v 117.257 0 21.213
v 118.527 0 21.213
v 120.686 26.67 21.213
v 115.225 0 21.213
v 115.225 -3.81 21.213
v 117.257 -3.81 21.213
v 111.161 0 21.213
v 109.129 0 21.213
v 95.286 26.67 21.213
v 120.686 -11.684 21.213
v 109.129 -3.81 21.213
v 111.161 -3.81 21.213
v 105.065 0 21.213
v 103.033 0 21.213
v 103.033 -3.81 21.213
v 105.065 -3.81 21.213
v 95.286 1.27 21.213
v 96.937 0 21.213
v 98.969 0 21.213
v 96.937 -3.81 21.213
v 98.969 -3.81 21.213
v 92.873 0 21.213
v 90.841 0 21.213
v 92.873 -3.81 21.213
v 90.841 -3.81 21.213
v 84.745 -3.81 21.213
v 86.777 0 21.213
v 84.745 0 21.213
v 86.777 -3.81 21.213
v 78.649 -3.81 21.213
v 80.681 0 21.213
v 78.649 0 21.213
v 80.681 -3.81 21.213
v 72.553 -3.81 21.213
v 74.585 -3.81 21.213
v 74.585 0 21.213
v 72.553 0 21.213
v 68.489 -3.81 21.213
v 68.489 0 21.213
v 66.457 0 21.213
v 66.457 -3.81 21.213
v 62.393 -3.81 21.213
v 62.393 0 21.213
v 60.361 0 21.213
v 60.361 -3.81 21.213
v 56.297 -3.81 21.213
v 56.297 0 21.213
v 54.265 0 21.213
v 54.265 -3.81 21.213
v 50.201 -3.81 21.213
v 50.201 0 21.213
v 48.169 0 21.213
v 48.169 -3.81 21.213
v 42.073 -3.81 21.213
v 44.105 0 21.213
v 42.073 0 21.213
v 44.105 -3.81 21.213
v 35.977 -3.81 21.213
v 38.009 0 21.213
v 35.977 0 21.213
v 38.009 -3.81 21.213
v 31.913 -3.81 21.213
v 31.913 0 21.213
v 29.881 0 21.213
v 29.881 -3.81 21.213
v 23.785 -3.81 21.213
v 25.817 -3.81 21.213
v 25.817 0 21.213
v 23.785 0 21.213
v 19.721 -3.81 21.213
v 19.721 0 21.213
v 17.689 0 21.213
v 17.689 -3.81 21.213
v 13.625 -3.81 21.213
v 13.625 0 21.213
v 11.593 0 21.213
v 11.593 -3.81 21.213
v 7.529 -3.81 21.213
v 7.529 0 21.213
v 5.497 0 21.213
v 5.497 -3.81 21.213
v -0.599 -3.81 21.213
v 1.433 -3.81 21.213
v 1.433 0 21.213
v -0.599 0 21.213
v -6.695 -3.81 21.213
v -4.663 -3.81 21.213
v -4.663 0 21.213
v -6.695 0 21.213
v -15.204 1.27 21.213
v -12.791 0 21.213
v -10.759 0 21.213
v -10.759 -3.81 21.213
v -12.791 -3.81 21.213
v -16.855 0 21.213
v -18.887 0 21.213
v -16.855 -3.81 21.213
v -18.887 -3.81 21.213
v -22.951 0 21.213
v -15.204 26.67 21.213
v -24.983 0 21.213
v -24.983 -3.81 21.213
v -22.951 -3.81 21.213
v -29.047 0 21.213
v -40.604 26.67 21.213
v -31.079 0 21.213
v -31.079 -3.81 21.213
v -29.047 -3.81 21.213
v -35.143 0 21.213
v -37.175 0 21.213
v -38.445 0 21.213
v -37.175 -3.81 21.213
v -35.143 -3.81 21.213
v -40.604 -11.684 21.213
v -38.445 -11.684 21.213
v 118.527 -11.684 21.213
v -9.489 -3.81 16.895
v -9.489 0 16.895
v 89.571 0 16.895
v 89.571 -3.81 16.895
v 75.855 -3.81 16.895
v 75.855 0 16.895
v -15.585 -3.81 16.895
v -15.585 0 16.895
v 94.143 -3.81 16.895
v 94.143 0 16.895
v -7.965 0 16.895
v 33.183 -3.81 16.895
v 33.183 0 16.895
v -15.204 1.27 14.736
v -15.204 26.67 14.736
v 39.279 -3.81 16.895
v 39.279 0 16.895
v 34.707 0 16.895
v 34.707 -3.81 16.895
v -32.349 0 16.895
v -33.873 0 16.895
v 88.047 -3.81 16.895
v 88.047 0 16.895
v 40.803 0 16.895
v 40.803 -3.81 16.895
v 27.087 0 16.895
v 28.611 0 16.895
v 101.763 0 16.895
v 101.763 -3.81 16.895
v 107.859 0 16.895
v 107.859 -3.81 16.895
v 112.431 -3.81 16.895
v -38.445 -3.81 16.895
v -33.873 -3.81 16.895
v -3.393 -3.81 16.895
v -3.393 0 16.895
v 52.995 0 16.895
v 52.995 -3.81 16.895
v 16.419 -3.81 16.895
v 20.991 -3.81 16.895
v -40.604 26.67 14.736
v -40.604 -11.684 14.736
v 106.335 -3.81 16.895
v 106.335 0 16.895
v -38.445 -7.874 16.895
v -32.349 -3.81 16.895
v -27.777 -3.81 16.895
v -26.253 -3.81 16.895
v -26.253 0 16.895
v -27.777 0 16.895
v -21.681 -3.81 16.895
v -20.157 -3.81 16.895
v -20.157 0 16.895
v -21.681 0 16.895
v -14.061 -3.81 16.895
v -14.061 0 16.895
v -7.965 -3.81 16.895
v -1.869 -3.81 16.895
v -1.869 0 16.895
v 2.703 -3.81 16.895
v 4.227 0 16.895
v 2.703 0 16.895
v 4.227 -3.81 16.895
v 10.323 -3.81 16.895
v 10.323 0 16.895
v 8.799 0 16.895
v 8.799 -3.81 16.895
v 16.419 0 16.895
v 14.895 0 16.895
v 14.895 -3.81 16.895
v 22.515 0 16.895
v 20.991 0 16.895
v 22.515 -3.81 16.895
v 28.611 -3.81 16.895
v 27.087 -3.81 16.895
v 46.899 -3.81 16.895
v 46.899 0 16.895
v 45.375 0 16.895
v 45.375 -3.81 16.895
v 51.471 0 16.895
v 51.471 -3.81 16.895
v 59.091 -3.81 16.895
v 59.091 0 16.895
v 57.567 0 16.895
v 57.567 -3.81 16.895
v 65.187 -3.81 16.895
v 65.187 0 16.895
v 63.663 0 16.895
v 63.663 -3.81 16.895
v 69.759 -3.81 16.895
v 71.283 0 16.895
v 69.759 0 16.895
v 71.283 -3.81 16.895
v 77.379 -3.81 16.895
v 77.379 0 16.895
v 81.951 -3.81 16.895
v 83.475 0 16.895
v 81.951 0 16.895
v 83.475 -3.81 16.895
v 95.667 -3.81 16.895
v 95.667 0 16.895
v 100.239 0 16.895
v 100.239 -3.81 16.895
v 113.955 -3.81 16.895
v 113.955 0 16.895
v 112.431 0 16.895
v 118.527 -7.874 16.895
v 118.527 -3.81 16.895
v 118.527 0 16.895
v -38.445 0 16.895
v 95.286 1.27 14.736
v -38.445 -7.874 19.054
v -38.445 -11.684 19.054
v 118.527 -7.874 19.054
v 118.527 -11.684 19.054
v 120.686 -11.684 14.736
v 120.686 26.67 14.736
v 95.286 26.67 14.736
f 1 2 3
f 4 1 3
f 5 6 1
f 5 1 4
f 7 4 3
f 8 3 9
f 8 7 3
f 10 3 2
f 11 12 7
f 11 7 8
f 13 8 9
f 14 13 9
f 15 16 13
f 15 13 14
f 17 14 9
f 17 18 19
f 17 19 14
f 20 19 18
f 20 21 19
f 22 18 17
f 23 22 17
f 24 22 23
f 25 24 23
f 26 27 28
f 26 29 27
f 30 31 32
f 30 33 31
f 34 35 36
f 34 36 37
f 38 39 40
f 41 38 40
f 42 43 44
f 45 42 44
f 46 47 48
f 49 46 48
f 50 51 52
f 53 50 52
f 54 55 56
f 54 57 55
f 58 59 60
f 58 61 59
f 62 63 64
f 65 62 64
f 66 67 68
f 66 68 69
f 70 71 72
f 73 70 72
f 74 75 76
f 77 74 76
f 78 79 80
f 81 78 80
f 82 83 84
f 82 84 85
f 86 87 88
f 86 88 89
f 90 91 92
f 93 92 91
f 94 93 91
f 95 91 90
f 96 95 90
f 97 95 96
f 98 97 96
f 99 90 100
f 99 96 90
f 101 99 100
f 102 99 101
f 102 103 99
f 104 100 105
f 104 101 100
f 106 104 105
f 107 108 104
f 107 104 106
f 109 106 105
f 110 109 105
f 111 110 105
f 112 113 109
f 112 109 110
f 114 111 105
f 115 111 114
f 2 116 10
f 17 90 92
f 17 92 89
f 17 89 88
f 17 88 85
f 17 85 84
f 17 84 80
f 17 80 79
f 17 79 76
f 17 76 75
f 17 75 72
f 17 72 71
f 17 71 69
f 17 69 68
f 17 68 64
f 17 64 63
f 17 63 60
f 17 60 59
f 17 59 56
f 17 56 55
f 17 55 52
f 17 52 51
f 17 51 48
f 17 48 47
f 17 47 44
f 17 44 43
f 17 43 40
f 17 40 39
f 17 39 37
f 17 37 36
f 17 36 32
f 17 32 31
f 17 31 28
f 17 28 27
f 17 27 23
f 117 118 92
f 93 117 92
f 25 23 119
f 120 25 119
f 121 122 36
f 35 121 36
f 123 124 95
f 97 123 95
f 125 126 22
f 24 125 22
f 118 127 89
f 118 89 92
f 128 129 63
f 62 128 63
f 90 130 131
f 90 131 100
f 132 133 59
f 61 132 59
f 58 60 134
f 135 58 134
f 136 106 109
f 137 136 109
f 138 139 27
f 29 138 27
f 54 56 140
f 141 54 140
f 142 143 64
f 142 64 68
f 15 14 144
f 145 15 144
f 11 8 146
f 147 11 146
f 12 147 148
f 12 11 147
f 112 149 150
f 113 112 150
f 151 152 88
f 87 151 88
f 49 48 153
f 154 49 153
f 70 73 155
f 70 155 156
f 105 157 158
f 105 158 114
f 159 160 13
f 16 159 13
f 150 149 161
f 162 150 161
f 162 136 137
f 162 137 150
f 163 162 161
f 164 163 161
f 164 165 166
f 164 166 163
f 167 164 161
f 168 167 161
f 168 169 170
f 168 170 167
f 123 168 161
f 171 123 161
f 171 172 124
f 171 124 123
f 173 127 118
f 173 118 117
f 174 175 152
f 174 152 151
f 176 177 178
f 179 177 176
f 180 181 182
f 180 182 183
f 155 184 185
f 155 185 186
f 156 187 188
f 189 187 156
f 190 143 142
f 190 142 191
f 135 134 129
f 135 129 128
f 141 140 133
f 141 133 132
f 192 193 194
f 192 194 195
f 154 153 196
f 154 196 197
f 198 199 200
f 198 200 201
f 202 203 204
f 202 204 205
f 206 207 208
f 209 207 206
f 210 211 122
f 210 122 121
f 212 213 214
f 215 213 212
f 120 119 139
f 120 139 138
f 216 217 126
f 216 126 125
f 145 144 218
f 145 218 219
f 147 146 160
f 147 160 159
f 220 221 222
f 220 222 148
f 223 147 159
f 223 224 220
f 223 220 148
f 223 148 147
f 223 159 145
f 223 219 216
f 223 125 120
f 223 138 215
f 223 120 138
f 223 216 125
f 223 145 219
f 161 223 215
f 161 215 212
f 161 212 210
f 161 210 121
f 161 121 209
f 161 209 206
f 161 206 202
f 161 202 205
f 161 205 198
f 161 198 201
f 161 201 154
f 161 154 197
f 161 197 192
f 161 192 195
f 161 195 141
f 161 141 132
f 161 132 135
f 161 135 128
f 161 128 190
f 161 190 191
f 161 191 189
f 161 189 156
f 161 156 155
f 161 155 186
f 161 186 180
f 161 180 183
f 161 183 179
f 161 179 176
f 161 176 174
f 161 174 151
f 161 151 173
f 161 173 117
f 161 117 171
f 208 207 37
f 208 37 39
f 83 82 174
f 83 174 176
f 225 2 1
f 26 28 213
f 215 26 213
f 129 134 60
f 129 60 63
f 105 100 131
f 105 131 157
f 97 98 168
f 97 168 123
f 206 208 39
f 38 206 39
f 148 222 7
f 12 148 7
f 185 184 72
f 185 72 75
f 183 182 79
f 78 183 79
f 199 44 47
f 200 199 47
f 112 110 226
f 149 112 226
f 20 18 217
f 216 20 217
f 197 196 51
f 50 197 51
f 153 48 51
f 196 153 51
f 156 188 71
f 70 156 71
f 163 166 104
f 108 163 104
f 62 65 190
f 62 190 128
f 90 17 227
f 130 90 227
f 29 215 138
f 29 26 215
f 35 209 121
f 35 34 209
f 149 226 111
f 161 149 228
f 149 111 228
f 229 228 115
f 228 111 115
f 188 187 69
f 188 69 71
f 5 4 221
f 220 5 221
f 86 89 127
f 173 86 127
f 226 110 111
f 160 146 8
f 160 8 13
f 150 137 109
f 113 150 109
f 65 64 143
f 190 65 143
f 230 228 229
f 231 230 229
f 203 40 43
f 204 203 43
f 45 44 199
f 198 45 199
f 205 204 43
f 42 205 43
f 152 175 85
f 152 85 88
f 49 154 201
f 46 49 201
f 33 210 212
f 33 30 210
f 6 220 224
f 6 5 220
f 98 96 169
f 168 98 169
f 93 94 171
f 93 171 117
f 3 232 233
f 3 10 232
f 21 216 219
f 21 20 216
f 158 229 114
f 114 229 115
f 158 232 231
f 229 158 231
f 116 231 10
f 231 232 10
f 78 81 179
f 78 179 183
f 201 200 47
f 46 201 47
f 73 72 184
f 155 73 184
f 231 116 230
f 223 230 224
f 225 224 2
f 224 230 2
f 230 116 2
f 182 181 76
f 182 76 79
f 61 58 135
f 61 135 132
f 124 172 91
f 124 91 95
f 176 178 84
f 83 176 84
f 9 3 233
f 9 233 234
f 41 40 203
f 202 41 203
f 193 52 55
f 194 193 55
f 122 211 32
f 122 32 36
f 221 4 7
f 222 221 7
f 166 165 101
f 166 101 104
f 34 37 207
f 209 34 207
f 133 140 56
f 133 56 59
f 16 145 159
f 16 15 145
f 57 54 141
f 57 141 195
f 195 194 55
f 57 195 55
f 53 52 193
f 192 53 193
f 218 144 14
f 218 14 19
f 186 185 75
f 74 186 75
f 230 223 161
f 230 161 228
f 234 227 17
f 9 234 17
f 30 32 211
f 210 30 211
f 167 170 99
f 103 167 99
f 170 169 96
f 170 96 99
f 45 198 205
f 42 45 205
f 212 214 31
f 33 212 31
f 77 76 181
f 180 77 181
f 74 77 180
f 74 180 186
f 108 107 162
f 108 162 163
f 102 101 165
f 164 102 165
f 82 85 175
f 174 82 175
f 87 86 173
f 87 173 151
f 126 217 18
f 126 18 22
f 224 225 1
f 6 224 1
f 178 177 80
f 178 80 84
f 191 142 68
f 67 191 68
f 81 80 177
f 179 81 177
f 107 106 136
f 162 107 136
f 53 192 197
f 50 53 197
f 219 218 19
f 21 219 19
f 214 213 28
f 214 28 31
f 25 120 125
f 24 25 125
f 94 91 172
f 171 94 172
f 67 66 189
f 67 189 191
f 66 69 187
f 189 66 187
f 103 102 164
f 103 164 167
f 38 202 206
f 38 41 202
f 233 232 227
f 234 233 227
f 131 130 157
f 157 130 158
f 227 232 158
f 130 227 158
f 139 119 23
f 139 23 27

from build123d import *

# Parameters (mm, degrees)
F1_DEPTH  = 3.81
F5_DEPTH  = 156.972
F7_DEPTH  = 1.27
F9_W      = 12.954
F9_H      = 2.159
F9_H_2    = 4.318
F10_DEPTH = 2.159
F11_W     = 12.954
F11_H     = 4.318
F11_H_2   = 2.159
F12_DEPTH = 2.159
F13_W     = 25.4
F13_H     = 6.477
F14_DEPTH = 25.4


with BuildPart() as f1:
    # F0 (on Front) → F1 (new body)
    with BuildSketch(Plane.XZ):
        Polygon((-37.1748663006, 21.2125933835), (-38.4448663006, 16.8945933835), (-33.8728663006, 16.8945933835), (-35.1428663006, 21.2125933835), align=None)
        Polygon((-33.8728663006, 16.8945933835), (-38.4448663006, 16.8945933835), (-38.4448663006, 14.7355933835), (118.5271336994, 14.7355933835), (118.5271336994, 16.8945933835), (113.9551336994, 16.8945933835), (112.4311336994, 16.8945933835), (107.8591336994, 16.8945933835), (106.3351336994, 16.8945933835), (101.7631336994, 16.8945933835), (100.2391336994, 16.8945933835), (95.6671336994, 16.8945933835), (94.1431336994, 16.8945933835), (89.5711336994, 16.8945933835), (88.0471336994, 16.8945933835), (83.4751336994, 16.8945933835), (81.9511336994, 16.8945933835), (77.3791336994, 16.8945933835), (75.8551336994, 16.8945933835), (71.2831336994, 16.8945933835), (69.7591336994, 16.8945933835), (65.1871336994, 16.8945933835), (63.6631336994, 16.8945933835), (59.0911336994, 16.8945933835), (57.5671336994, 16.8945933835), (52.9951336994, 16.8945933835), (51.4711336994, 16.8945933835), (46.8991336994, 16.8945933835), (45.3751336994, 16.8945933835), (40.8031336994, 16.8945933835), (39.2791336994, 16.8945933835), (34.7071336994, 16.8945933835), (33.1831336994, 16.8945933835), (28.6111336994, 16.8945933835), (27.0871336994, 16.8945933835), (22.5151336994, 16.8945933835), (20.9911336994, 16.8945933835), (16.4191336994, 16.8945933835), (14.8951336994, 16.8945933835), (10.3231336994, 16.8945933835), (8.7991336994, 16.8945933835), (4.2271336994, 16.8945933835), (2.7031336994, 16.8945933835), (-1.8688663006, 16.8945933835), (-3.3928663006, 16.8945933835), (-7.9648663006, 16.8945933835), (-9.4888663006, 16.8945933835), (-14.0608663006, 16.8945933835), (-15.5848663006, 16.8945933835), (-20.1568663006, 16.8945933835), (-21.6808663006, 16.8945933835), (-26.2528663006, 16.8945933835), (-27.7768663006, 16.8945933835), (-32.3488663006, 16.8945933835), align=None)
        Polygon((-31.0788663006, 21.2125933835), (-32.3488663006, 16.8945933835), (-27.7768663006, 16.8945933835), (-29.0468663006, 21.2125933835), align=None)
        Polygon((113.9551336994, 16.8945933835), (118.5271336994, 16.8945933835), (117.2571336994, 21.2125933835), (115.2251336994, 21.2125933835), align=None)
        Polygon((-24.9828663006, 21.2125933835), (-26.2528663006, 16.8945933835), (-21.6808663006, 16.8945933835), (-22.9508663006, 21.2125933835), align=None)
        Polygon((107.8591336994, 16.8945933835), (112.4311336994, 16.8945933835), (111.1611336994, 21.2125933835), (109.1291336994, 21.2125933835), align=None)
        Polygon((-18.8868663006, 21.2125933835), (-20.1568663006, 16.8945933835), (-15.5848663006, 16.8945933835), (-16.8548663006, 21.2125933835), align=None)
        Polygon((101.7631336994, 16.8945933835), (106.3351336994, 16.8945933835), (105.0651336994, 21.2125933835), (103.0331336994, 21.2125933835), align=None)
        Polygon((-12.7908663006, 21.2125933835), (-14.0608663006, 16.8945933835), (-9.4888663006, 16.8945933835), (-10.7588663006, 21.2125933835), align=None)
        Polygon((95.6671336994, 16.8945933835), (100.2391336994, 16.8945933835), (98.9691336994, 21.2125933835), (96.9371336994, 21.2125933835), align=None)
        Polygon((-6.6948663006, 21.2125933835), (-7.9648663006, 16.8945933835), (-3.3928663006, 16.8945933835), (-4.6628663006, 21.2125933835), align=None)
        Polygon((89.5711336994, 16.8945933835), (94.1431336994, 16.8945933835), (92.8731336994, 21.2125933835), (90.8411336994, 21.2125933835), align=None)
        Polygon((-0.5988663006, 21.2125933835), (-1.8688663006, 16.8945933835), (2.7031336994, 16.8945933835), (1.4331336994, 21.2125933835), align=None)
        Polygon((83.4751336994, 16.8945933835), (88.0471336994, 16.8945933835), (86.7771336994, 21.2125933835), (84.7451336994, 21.2125933835), align=None)
        Polygon((5.4971336994, 21.2125933835), (4.2271336994, 16.8945933835), (8.7991336994, 16.8945933835), (7.5291336994, 21.2125933835), align=None)
        Polygon((77.3791336994, 16.8945933835), (81.9511336994, 16.8945933835), (80.6811336994, 21.2125933835), (78.6491336994, 21.2125933835), align=None)
        Polygon((11.5931336994, 21.2125933835), (10.3231336994, 16.8945933835), (14.8951336994, 16.8945933835), (13.6251336994, 21.2125933835), align=None)
        Polygon((71.2831336994, 16.8945933835), (75.8551336994, 16.8945933835), (74.5851336994, 21.2125933835), (72.5531336994, 21.2125933835), align=None)
        Polygon((17.6891336994, 21.2125933835), (16.4191336994, 16.8945933835), (20.9911336994, 16.8945933835), (19.7211336994, 21.2125933835), align=None)
        Polygon((65.1871336994, 16.8945933835), (69.7591336994, 16.8945933835), (68.4891336994, 21.2125933835), (66.4571336994, 21.2125933835), align=None)
        Polygon((23.7851336994, 21.2125933835), (22.5151336994, 16.8945933835), (27.0871336994, 16.8945933835), (25.8171336994, 21.2125933835), align=None)
        Polygon((59.0911336994, 16.8945933835), (63.6631336994, 16.8945933835), (62.3931336994, 21.2125933835), (60.3611336994, 21.2125933835), align=None)
        Polygon((29.8811336994, 21.2125933835), (28.6111336994, 16.8945933835), (33.1831336994, 16.8945933835), (31.9131336994, 21.2125933835), align=None)
        Polygon((52.9951336994, 16.8945933835), (57.5671336994, 16.8945933835), (56.2971336994, 21.2125933835), (54.2651336994, 21.2125933835), align=None)
        Polygon((35.9771336994, 21.2125933835), (34.7071336994, 16.8945933835), (39.2791336994, 16.8945933835), (38.0091336994, 21.2125933835), align=None)
        Polygon((46.8991336994, 16.8945933835), (51.4711336994, 16.8945933835), (50.2011336994, 21.2125933835), (48.1691336994, 21.2125933835), align=None)
        Polygon((42.0731336994, 21.2125933835), (40.8031336994, 16.8945933835), (45.3751336994, 16.8945933835), (44.1051336994, 21.2125933835), align=None)
    extrude(amount=F1_DEPTH)

    # F4 (on plane+point) → F5 (join, through all)
    with BuildSketch(Plane.YZ.offset(118.5271336994)):
        Polygon((-11.684, 14.7355933835), (-3.81, 14.7355933835), (-3.81, 16.8945933835), (-7.874, 16.8945933835), (-7.874, 19.0535933835), (-11.684, 19.0535933835), (-11.684, 16.8945933835), align=None)
    extrude(amount=-F5_DEPTH)

    # F6 (on face) → F7 (join)
    with BuildSketch(Plane(origin=(0, 0, 0), x_dir=(-1, 0, 0), z_dir=(0, 1, 0))):
        Polygon((33.8728663006, 16.8945933835), (35.1428663006, 21.2125933835), (31.0788663006, 21.2125933835), (32.3488663006, 16.8945933835), align=None)
        Polygon((27.7768663006, 16.8945933835), (29.0468663006, 21.2125933835), (24.9828663006, 21.2125933835), (26.2528663006, 16.8945933835), align=None)
        Polygon((21.6808663006, 16.8945933835), (22.9508663006, 21.2125933835), (18.8868663006, 21.2125933835), (20.1568663006, 16.8945933835), align=None)
        Polygon((15.5848663006, 16.8945933835), (16.8548663006, 21.2125933835), (12.7908663006, 21.2125933835), (14.0608663006, 16.8945933835), align=None)
        Polygon((9.4888663006, 16.8945933835), (10.7588663006, 21.2125933835), (6.6948663006, 21.2125933835), (7.9648663006, 16.8945933835), align=None)
        Polygon((3.3928663006, 16.8945933835), (4.6628663006, 21.2125933835), (0.5988663006, 21.2125933835), (1.8688663006, 16.8945933835), align=None)
        Polygon((-2.7031336994, 16.8945933835), (-1.4331336994, 21.2125933835), (-5.4971336994, 21.2125933835), (-4.2271336994, 16.8945933835), align=None)
        Polygon((-8.7991336994, 16.8945933835), (-7.5291336994, 21.2125933835), (-11.5931336994, 21.2125933835), (-10.3231336994, 16.8945933835), align=None)
        Polygon((-14.8951336994, 16.8945933835), (-13.6251336994, 21.2125933835), (-17.6891336994, 21.2125933835), (-16.4191336994, 16.8945933835), align=None)
        Polygon((-20.9911336994, 16.8945933835), (-19.7211336994, 21.2125933835), (-23.7851336994, 21.2125933835), (-22.5151336994, 16.8945933835), align=None)
        Polygon((-27.0871336994, 16.8945933835), (-25.8171336994, 21.2125933835), (-29.8811336994, 21.2125933835), (-28.6111336994, 16.8945933835), align=None)
        Polygon((-118.5271336994, 14.7355933835), (38.4448663006, 14.7355933835), (38.4448663006, 16.8945933835), (37.1748663006, 21.2125933835), (35.1428663006, 21.2125933835), (33.8728663006, 16.8945933835), (32.3488663006, 16.8945933835), (31.0788663006, 21.2125933835), (29.0468663006, 21.2125933835), (27.7768663006, 16.8945933835), (26.2528663006, 16.8945933835), (24.9828663006, 21.2125933835), (22.9508663006, 21.2125933835), (21.6808663006, 16.8945933835), (20.1568663006, 16.8945933835), (18.8868663006, 21.2125933835), (16.8548663006, 21.2125933835), (15.5848663006, 16.8945933835), (14.0608663006, 16.8945933835), (12.7908663006, 21.2125933835), (10.7588663006, 21.2125933835), (9.4888663006, 16.8945933835), (7.9648663006, 16.8945933835), (6.6948663006, 21.2125933835), (4.6628663006, 21.2125933835), (3.3928663006, 16.8945933835), (1.8688663006, 16.8945933835), (0.5988663006, 21.2125933835), (-1.4331336994, 21.2125933835), (-2.7031336994, 16.8945933835), (-4.2271336994, 16.8945933835), (-5.4971336994, 21.2125933835), (-7.5291336994, 21.2125933835), (-8.7991336994, 16.8945933835), (-10.3231336994, 16.8945933835), (-11.5931336994, 21.2125933835), (-13.6251336994, 21.2125933835), (-14.8951336994, 16.8945933835), (-16.4191336994, 16.8945933835), (-17.6891336994, 21.2125933835), (-19.7211336994, 21.2125933835), (-20.9911336994, 16.8945933835), (-22.5151336994, 16.8945933835), (-23.7851336994, 21.2125933835), (-25.8171336994, 21.2125933835), (-27.0871336994, 16.8945933835), (-28.6111336994, 16.8945933835), (-29.8811336994, 21.2125933835), (-31.9131336994, 21.2125933835), (-33.1831336994, 16.8945933835), (-34.7071336994, 16.8945933835), (-35.9771336994, 21.2125933835), (-38.0091336994, 21.2125933835), (-39.2791336994, 16.8945933835), (-40.8031336994, 16.8945933835), (-42.0731336994, 21.2125933835), (-44.1051336994, 21.2125933835), (-45.3751336994, 16.8945933835), (-46.8991336994, 16.8945933835), (-48.1691336994, 21.2125933835), (-50.2011336994, 21.2125933835), (-51.4711336994, 16.8945933835), (-52.9951336994, 16.8945933835), (-54.2651336994, 21.2125933835), (-56.2971336994, 21.2125933835), (-57.5671336994, 16.8945933835), (-59.0911336994, 16.8945933835), (-60.3611336994, 21.2125933835), (-62.3931336994, 21.2125933835), (-63.6631336994, 16.8945933835), (-65.1871336994, 16.8945933835), (-66.4571336994, 21.2125933835), (-68.4891336994, 21.2125933835), (-69.7591336994, 16.8945933835), (-71.2831336994, 16.8945933835), (-72.5531336994, 21.2125933835), (-74.5851336994, 21.2125933835), (-75.8551336994, 16.8945933835), (-77.3791336994, 16.8945933835), (-78.6491336994, 21.2125933835), (-80.6811336994, 21.2125933835), (-81.9511336994, 16.8945933835), (-83.4751336994, 16.8945933835), (-84.7451336994, 21.2125933835), (-86.7771336994, 21.2125933835), (-88.0471336994, 16.8945933835), (-89.5711336994, 16.8945933835), (-90.8411336994, 21.2125933835), (-92.8731336994, 21.2125933835), (-94.1431336994, 16.8945933835), (-95.6671336994, 16.8945933835), (-96.9371336994, 21.2125933835), (-98.9691336994, 21.2125933835), (-100.2391336994, 16.8945933835), (-101.7631336994, 16.8945933835), (-103.0331336994, 21.2125933835), (-105.0651336994, 21.2125933835), (-106.3351336994, 16.8945933835), (-107.8591336994, 16.8945933835), (-109.1291336994, 21.2125933835), (-111.1611336994, 21.2125933835), (-112.4311336994, 16.8945933835), (-113.9551336994, 16.8945933835), (-115.2251336994, 21.2125933835), (-117.2571336994, 21.2125933835), (-118.5271336994, 16.8945933835), align=None)
        Polygon((-111.1611336994, 21.2125933835), (-115.2251336994, 21.2125933835), (-113.9551336994, 16.8945933835), (-112.4311336994, 16.8945933835), align=None)
        Polygon((-105.0651336994, 21.2125933835), (-109.1291336994, 21.2125933835), (-107.8591336994, 16.8945933835), (-106.3351336994, 16.8945933835), align=None)
        Polygon((-98.9691336994, 21.2125933835), (-103.0331336994, 21.2125933835), (-101.7631336994, 16.8945933835), (-100.2391336994, 16.8945933835), align=None)
        Polygon((-92.8731336994, 21.2125933835), (-96.9371336994, 21.2125933835), (-95.6671336994, 16.8945933835), (-94.1431336994, 16.8945933835), align=None)
        Polygon((-86.7771336994, 21.2125933835), (-90.8411336994, 21.2125933835), (-89.5711336994, 16.8945933835), (-88.0471336994, 16.8945933835), align=None)
        Polygon((-80.6811336994, 21.2125933835), (-84.7451336994, 21.2125933835), (-83.4751336994, 16.8945933835), (-81.9511336994, 16.8945933835), align=None)
        Polygon((-74.5851336994, 21.2125933835), (-78.6491336994, 21.2125933835), (-77.3791336994, 16.8945933835), (-75.8551336994, 16.8945933835), align=None)
        Polygon((-68.4891336994, 21.2125933835), (-72.5531336994, 21.2125933835), (-71.2831336994, 16.8945933835), (-69.7591336994, 16.8945933835), align=None)
        Polygon((-62.3931336994, 21.2125933835), (-66.4571336994, 21.2125933835), (-65.1871336994, 16.8945933835), (-63.6631336994, 16.8945933835), align=None)
        Polygon((-56.2971336994, 21.2125933835), (-60.3611336994, 21.2125933835), (-59.0911336994, 16.8945933835), (-57.5671336994, 16.8945933835), align=None)
        Polygon((-50.2011336994, 21.2125933835), (-54.2651336994, 21.2125933835), (-52.9951336994, 16.8945933835), (-51.4711336994, 16.8945933835), align=None)
        Polygon((-44.1051336994, 21.2125933835), (-48.1691336994, 21.2125933835), (-46.8991336994, 16.8945933835), (-45.3751336994, 16.8945933835), align=None)
        Polygon((-39.2791336994, 16.8945933835), (-38.0091336994, 21.2125933835), (-42.0731336994, 21.2125933835), (-40.8031336994, 16.8945933835), align=None)
        Polygon((-33.1831336994, 16.8945933835), (-31.9131336994, 21.2125933835), (-35.9771336994, 21.2125933835), (-34.7071336994, 16.8945933835), align=None)
        Polygon((-118.5271336994, 21.2125933835), (-118.5271336994, 16.8945933835), (-117.2571336994, 21.2125933835), align=None)
        Polygon((37.1748663006, 21.2125933835), (38.4448663006, 16.8945933835), (38.4448663006, 21.2125933835), align=None)
    extrude(amount=F7_DEPTH)

    # F9 (on face) → F10 (join)
    with BuildSketch(Plane.YZ.offset(118.5271336994)):
        with Locations((-5.207, 15.8150933835)):
            Rectangle(F9_W, F9_H)
        with Locations((-5.207, 19.0535933835)):
            Rectangle(F9_W, F9_H_2)
    extrude(amount=F10_DEPTH)

    # F11 (on face) → F12 (join)
    with BuildSketch(Plane(origin=(-38.4448663006, 0, 0), x_dir=(0, -1, 0), z_dir=(-1, 0, 0))):
        with Locations((5.207, 19.0535933835)):
            Rectangle(F11_W, F11_H)
        with Locations((5.207, 15.8150933835)):
            Rectangle(F11_W, F11_H_2)
    extrude(amount=F12_DEPTH)

    # F13 (on face) → F14 (join)
    with BuildSketch(Plane(origin=(0, 1.27, 0), x_dir=(-1, 0, 0), z_dir=(0, 1, 0))):
        with Locations((27.9038663006, 17.9740933835)):
            Rectangle(F13_W, F13_H)
        with Locations((-107.9861336994, 17.9740933835)):
            Rectangle(F13_W, F13_H)
    extrude(amount=F14_DEPTH)


solid = f1.part
